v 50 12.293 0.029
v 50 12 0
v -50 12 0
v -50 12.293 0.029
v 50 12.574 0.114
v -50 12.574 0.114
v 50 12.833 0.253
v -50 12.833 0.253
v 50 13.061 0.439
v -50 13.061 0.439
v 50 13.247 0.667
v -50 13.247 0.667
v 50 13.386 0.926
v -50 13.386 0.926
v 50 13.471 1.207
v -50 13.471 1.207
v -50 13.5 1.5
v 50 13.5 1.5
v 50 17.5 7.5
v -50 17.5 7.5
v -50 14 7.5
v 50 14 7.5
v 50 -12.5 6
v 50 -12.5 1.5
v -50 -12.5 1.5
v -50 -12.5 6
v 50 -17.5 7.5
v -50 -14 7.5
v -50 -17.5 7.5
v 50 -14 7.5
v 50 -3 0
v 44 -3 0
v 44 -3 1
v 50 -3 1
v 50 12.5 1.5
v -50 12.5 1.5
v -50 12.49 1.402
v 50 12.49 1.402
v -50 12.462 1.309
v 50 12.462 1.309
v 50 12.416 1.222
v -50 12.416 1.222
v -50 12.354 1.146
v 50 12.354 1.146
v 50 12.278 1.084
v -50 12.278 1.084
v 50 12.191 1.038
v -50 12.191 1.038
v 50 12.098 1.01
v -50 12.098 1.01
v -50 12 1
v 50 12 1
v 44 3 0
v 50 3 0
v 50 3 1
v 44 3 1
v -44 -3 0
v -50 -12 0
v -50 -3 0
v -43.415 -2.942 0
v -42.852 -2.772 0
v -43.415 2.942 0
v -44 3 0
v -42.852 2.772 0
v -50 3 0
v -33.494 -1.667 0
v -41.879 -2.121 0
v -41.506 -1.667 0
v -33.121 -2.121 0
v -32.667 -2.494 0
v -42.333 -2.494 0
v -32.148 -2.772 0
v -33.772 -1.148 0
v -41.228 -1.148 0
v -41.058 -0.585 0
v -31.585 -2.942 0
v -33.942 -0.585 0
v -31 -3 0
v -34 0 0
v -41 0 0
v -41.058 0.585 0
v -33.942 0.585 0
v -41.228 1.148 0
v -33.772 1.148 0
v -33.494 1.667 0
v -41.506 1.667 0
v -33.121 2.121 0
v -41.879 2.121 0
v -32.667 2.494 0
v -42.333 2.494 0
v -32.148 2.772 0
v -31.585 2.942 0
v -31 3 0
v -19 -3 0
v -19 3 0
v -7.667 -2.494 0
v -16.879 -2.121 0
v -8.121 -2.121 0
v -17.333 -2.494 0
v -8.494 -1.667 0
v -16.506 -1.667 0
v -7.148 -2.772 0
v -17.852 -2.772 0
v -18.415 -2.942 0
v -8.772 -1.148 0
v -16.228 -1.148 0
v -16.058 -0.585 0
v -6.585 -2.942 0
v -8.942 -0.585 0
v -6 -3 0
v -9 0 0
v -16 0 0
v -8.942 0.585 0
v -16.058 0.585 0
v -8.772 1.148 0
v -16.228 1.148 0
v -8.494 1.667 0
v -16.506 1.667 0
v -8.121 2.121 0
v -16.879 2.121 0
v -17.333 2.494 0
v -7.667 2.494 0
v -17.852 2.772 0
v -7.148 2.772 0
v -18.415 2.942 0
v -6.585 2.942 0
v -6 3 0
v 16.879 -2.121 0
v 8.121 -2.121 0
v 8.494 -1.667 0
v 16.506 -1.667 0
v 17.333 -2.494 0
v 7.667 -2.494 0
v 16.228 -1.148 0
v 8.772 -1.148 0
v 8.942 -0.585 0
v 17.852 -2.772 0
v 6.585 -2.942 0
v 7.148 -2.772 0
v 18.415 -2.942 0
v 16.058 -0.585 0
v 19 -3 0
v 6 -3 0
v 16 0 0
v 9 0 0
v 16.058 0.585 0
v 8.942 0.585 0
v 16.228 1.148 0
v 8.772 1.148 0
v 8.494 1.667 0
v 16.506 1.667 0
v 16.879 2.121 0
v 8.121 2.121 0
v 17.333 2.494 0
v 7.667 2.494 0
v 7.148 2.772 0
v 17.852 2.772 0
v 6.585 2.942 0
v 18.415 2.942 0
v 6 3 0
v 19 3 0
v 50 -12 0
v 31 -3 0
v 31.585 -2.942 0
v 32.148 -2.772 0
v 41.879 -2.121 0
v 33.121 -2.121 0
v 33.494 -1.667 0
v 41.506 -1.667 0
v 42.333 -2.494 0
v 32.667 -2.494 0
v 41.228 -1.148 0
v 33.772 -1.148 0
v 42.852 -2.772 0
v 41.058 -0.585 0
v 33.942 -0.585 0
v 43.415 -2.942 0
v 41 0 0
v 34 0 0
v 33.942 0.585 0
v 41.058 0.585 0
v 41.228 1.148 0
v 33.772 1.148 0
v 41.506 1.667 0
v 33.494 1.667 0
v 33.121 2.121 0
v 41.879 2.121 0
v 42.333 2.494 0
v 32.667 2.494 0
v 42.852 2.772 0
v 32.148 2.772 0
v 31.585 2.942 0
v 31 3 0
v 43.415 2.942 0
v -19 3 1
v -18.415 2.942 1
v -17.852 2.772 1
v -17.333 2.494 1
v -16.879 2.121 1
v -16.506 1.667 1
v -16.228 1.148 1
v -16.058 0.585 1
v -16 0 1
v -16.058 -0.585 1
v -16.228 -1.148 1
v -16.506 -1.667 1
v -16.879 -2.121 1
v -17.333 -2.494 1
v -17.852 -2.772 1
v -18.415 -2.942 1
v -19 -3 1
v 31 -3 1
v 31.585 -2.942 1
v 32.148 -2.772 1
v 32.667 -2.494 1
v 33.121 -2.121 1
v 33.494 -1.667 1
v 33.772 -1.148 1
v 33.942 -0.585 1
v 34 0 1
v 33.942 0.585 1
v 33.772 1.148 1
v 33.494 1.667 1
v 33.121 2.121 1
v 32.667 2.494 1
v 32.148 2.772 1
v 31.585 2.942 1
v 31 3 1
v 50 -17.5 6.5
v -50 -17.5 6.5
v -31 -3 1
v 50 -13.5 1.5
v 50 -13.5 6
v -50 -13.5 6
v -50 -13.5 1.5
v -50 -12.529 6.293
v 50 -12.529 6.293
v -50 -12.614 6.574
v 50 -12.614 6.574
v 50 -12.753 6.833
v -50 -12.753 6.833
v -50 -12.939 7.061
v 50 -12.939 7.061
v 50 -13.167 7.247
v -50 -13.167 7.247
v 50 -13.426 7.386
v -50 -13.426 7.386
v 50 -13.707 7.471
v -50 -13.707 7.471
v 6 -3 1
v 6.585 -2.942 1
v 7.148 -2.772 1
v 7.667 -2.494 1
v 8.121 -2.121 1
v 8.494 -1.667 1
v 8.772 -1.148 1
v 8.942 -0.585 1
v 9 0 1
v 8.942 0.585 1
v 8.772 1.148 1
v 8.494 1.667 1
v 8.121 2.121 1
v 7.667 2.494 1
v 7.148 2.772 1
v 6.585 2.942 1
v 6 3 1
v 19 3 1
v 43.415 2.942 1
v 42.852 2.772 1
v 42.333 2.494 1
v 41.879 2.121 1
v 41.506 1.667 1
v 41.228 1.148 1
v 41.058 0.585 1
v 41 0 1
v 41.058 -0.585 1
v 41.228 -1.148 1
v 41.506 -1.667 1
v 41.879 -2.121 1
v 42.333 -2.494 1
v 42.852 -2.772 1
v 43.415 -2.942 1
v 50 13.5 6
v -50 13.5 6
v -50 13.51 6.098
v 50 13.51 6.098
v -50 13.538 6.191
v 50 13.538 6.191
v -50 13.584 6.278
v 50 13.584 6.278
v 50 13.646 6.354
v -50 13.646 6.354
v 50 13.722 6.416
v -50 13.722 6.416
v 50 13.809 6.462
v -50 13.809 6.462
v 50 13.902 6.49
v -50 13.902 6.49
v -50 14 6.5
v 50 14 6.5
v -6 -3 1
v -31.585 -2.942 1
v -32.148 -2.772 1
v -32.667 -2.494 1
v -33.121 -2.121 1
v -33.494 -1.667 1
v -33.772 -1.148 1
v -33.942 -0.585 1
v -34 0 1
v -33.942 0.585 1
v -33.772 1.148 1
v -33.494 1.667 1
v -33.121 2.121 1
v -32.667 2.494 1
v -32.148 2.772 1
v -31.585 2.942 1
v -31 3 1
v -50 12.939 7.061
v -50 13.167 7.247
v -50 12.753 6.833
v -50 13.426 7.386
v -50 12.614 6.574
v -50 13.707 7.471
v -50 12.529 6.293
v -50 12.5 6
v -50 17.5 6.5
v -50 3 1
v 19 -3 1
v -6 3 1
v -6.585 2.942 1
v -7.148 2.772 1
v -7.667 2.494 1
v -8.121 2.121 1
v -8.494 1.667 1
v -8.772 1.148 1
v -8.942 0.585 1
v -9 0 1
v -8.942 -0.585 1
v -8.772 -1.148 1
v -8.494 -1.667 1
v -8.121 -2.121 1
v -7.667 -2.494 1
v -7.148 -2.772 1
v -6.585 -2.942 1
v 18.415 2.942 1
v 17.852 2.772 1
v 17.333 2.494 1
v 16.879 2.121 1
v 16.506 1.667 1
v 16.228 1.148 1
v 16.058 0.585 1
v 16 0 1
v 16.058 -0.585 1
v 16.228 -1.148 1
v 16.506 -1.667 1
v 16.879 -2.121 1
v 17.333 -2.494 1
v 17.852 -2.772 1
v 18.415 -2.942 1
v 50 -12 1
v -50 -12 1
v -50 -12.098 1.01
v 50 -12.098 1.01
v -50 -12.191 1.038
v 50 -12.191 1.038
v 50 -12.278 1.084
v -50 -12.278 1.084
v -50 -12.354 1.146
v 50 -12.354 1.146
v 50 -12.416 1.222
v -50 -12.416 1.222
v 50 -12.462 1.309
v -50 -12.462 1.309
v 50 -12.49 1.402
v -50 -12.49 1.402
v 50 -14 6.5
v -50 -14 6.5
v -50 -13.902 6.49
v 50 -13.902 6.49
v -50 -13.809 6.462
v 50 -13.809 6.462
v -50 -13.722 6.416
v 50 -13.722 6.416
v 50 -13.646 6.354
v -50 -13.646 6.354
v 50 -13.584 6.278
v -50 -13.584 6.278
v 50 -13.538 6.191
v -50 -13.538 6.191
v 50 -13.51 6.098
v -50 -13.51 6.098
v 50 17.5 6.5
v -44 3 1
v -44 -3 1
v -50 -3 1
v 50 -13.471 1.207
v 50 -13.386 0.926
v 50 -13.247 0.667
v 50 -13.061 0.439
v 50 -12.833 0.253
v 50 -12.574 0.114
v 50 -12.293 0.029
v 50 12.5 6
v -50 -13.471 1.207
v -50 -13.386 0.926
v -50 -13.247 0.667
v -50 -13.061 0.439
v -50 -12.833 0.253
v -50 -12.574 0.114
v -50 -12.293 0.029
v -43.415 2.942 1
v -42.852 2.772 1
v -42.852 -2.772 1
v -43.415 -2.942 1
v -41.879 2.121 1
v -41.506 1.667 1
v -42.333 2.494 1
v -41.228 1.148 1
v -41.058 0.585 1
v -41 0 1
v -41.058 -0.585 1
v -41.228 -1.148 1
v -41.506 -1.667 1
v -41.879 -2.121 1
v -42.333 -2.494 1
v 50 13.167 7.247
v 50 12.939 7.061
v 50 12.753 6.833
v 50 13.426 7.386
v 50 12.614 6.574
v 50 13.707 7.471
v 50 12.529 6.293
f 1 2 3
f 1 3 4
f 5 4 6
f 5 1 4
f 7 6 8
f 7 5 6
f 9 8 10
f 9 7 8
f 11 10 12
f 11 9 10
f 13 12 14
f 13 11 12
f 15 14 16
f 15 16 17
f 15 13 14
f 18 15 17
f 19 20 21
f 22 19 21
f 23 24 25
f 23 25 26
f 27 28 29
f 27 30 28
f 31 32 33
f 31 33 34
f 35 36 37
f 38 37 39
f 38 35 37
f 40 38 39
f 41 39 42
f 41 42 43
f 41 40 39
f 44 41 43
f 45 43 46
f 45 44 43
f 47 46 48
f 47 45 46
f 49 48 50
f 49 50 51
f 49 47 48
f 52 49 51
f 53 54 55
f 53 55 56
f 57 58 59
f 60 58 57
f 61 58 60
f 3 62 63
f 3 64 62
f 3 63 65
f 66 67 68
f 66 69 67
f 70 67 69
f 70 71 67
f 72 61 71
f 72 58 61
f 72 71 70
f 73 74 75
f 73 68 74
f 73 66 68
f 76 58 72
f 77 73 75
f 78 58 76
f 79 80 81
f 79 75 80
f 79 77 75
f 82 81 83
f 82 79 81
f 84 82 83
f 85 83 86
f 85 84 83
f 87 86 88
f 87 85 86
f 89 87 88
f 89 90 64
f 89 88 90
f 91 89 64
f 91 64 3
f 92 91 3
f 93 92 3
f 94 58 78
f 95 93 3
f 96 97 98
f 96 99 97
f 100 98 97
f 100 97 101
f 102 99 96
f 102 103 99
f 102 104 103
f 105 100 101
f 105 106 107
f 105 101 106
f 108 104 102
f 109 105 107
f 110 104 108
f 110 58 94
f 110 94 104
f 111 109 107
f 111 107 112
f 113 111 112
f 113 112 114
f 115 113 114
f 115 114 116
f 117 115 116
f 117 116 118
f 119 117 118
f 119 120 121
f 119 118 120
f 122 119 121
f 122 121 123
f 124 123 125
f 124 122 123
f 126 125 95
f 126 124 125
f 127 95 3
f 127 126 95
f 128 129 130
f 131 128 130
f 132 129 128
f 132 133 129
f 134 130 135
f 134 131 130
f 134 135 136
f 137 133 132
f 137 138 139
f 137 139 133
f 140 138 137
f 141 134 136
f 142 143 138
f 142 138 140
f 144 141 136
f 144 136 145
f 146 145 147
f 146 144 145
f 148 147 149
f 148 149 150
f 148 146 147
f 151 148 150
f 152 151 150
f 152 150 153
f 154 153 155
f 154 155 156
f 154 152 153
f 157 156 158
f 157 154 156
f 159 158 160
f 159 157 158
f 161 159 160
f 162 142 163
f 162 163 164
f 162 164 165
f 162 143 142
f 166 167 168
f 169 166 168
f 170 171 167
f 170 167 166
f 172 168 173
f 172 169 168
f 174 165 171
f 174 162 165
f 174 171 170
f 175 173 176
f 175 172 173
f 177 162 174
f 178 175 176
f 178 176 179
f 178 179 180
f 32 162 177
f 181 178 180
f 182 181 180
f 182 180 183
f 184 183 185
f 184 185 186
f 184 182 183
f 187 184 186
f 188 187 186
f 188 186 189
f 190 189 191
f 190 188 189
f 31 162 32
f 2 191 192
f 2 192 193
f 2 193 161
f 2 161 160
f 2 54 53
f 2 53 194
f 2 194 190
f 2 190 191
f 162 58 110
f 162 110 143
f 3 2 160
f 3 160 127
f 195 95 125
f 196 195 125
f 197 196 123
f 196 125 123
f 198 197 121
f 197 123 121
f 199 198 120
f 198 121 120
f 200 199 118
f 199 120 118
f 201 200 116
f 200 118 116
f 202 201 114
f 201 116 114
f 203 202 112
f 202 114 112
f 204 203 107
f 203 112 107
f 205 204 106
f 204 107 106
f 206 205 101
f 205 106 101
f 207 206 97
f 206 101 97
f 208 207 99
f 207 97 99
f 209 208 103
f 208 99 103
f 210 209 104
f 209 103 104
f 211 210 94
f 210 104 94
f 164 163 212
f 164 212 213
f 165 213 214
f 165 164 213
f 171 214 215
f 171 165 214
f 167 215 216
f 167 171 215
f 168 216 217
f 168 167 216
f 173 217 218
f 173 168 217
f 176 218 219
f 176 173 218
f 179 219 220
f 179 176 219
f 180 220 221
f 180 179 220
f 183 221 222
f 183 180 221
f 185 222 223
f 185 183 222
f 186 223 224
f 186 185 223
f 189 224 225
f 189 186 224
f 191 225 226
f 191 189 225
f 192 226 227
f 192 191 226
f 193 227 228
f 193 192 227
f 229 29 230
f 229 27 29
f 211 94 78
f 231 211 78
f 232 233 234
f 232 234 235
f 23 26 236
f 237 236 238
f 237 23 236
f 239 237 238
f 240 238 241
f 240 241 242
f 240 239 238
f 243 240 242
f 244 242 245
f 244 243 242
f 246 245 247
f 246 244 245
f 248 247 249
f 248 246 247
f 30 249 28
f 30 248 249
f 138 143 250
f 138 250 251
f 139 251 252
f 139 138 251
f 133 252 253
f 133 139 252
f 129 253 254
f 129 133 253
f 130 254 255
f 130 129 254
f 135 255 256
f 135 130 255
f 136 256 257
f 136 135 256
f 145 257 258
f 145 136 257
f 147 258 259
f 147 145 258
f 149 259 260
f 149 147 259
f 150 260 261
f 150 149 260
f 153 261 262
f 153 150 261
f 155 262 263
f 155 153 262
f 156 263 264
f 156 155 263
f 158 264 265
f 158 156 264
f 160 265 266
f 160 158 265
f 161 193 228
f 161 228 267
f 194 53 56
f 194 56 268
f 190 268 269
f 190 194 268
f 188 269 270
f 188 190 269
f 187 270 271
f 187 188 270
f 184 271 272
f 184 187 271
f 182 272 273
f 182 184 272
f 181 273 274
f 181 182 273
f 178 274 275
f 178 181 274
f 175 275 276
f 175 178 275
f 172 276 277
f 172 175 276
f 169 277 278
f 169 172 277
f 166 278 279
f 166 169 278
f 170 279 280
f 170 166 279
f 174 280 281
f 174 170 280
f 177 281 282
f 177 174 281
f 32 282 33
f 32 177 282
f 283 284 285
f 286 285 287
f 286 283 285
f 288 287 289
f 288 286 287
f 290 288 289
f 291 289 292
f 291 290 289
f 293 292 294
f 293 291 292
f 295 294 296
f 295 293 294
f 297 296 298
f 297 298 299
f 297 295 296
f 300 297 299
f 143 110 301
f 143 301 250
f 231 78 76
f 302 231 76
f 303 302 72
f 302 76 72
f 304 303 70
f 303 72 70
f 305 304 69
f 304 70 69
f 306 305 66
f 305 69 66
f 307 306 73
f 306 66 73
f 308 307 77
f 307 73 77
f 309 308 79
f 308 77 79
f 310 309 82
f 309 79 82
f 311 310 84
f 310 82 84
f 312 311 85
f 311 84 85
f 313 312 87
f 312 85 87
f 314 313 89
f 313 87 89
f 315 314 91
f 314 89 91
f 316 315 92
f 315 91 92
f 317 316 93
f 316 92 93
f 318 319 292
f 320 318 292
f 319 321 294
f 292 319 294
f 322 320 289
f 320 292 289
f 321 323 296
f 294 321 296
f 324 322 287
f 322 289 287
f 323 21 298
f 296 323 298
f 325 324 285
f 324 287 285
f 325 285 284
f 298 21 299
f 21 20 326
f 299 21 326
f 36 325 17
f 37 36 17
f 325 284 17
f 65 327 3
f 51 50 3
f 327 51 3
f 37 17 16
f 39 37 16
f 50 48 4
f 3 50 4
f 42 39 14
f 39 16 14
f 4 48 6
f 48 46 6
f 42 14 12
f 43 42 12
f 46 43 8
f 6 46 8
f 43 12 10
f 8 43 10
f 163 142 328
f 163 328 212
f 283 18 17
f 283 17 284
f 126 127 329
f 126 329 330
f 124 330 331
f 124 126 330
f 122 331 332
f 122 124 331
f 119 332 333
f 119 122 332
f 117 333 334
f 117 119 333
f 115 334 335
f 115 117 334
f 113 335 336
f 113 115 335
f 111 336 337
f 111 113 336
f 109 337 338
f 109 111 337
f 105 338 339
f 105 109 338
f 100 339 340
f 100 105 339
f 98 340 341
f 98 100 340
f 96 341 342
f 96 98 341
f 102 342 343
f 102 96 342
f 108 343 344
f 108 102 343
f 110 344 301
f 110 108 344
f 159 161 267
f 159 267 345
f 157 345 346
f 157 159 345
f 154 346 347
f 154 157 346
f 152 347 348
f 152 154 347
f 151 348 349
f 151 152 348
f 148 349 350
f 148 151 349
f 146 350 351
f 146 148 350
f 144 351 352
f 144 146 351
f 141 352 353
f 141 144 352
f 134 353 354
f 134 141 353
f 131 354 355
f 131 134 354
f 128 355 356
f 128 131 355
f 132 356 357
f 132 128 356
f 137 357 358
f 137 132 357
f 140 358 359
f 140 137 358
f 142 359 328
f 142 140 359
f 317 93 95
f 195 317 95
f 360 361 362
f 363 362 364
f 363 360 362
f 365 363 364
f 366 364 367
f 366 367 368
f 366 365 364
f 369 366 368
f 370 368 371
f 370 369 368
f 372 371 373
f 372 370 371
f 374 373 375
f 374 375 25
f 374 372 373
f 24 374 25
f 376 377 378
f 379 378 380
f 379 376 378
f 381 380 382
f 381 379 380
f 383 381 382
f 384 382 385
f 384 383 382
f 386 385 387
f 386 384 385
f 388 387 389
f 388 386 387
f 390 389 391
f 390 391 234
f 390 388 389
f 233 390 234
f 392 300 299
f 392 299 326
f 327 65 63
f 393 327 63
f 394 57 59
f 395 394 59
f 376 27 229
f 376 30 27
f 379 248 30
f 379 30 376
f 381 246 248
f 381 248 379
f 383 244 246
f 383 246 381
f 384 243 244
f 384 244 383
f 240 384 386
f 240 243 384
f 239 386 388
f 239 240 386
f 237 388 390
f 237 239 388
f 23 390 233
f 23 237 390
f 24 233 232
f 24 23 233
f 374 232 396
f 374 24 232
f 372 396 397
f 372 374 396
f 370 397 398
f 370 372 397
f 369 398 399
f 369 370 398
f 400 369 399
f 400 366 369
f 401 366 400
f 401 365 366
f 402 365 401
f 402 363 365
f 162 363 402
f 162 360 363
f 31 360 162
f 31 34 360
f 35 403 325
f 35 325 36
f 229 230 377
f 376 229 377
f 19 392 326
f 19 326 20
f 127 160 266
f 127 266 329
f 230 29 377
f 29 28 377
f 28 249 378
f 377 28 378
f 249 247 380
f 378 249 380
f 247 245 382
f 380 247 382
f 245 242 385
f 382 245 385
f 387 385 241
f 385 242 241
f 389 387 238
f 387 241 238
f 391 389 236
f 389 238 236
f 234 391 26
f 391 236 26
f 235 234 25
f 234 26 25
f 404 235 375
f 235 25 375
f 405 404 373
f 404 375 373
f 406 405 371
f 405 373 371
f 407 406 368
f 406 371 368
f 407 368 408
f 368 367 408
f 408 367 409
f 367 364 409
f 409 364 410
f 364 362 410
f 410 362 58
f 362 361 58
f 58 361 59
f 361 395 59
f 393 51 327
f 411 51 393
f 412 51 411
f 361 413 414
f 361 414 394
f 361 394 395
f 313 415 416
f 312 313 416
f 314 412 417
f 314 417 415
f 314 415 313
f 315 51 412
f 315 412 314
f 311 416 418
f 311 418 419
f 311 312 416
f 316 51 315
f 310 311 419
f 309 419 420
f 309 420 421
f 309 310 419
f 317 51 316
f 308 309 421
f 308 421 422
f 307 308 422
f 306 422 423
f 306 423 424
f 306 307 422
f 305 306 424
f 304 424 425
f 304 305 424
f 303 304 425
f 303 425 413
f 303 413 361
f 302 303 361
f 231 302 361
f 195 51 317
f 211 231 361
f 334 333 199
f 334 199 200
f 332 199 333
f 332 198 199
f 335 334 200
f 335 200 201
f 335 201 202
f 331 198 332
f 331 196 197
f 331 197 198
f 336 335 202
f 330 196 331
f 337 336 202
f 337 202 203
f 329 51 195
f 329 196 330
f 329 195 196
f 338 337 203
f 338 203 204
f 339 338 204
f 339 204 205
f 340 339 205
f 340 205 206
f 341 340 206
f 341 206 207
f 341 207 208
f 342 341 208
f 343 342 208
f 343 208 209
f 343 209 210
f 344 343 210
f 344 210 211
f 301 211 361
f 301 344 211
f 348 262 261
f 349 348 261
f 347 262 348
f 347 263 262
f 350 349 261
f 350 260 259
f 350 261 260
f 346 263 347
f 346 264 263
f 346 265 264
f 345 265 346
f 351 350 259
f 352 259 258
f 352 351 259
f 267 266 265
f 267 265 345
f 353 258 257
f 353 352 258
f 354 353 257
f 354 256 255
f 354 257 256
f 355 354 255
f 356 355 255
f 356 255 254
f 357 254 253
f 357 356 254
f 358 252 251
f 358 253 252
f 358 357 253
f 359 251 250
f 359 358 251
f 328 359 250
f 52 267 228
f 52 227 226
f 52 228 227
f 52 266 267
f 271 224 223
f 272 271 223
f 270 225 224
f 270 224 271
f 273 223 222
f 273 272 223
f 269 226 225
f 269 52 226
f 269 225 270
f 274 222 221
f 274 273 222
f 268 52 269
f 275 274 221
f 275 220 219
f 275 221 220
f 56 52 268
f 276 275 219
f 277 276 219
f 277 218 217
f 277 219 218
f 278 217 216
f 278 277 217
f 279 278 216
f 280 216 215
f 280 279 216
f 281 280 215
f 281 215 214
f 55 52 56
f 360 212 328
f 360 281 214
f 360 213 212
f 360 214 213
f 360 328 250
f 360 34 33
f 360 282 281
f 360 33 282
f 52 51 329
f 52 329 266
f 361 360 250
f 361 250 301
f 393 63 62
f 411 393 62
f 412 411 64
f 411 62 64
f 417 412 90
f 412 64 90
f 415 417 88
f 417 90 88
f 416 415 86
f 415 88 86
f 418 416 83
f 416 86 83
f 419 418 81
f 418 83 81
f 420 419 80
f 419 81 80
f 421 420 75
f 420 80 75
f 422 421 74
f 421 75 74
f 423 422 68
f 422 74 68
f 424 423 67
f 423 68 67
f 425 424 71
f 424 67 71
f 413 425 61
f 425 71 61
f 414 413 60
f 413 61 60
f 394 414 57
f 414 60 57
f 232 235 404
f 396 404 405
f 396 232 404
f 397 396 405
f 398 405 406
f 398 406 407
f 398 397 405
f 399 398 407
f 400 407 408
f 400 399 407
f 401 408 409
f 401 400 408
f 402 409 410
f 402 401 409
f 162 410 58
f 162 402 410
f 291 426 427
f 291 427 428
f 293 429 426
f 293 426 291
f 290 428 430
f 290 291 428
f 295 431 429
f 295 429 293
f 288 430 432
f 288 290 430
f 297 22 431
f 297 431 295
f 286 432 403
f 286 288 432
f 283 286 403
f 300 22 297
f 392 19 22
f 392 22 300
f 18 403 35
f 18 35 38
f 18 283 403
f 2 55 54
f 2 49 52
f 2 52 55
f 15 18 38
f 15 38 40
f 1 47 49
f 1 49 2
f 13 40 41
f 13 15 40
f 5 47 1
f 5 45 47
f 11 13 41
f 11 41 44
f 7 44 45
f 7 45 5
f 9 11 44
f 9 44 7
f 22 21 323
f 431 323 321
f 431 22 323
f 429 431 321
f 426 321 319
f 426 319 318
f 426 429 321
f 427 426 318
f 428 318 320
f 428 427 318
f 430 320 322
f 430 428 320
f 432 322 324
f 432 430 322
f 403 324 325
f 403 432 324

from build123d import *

# Parameters (mm, degrees)
EXTRUDE_1_DEPTH           = 50
HOLE_WIZARD_6_0_6_1_DEPTH = 1
PATTERN_LINEAR_1_COUNT    = 3
PATTERN_LINEAR_1_PITCH    = 25
MIRROR_1_COPY_1_DEPTH     = 1
MIRROR_1_COPY_2_DEPTH     = 1
MIRROR_1_COPY_3_DEPTH     = 1


# Read off the part's stored shape, not the designer's step: Диаметр отверстия Ø6.0 (6)1
with BuildPart() as part:
    # Эскиз1 → Вытянуть-Тонкостенный1 (new, symmetric)
    with BuildSketch(Plane(origin=(0, 0, 0), x_dir=(0, 0, -1), z_dir=(1, 0, 0))):
        with BuildLine():
            Line((-6.5, -17.5), (-6.5, -14))
            ThreePointArc((-6.5, -14), (-6.353553391, -13.646446609), (-6, -13.5))
            Line((-6, -13.5), (-1.5, -13.5))
            ThreePointArc((-1.5, -13.5), (-0.439339828, -13.060660172), (0, -12))
            Line((0, -12), (0, 12))
            ThreePointArc((0, 12), (-0.439339828, 13.060660172), (-1.5, 13.5))
            Line((-1.5, 13.5), (-6, 13.5))
            ThreePointArc((-6, 13.5), (-6.353553391, 13.646446609), (-6.5, 14))
            Line((-6.5, 14), (-6.5, 17.5))
            Line((-6.5, 17.5), (-7.5, 17.5))
            Line((-7.5, 17.5), (-7.5, 14))
            ThreePointArc((-7.5, 14), (-7.060660172, 12.939339828), (-6, 12.5))
            Line((-6, 12.5), (-1.5, 12.5))
            ThreePointArc((-1.5, 12.5), (-1.146446609, 12.353553391), (-1, 12))
            Line((-1, 12), (-1, -12))
            ThreePointArc((-1, -12), (-1.146446609, -12.353553391), (-1.5, -12.5))
            Line((-1.5, -12.5), (-6, -12.5))
            ThreePointArc((-6, -12.5), (-7.060660172, -12.939339828), (-7.5, -14))
            Line((-7.5, -14), (-7.5, -17.5))
            Line((-7.5, -17.5), (-6.5, -17.5))
        make_face()
    extrude(amount=EXTRUDE_1_DEPTH, both=True)

    # Диаметр отверстия Ø6.0 (6)1 outline → Диаметр отверстия Ø6.0 (6)1 (cut)
    with BuildSketch(Plane.XY):
        with BuildLine():
            Line((-6, -3), (6, -3))
            ThreePointArc((6, -3), (9, 0), (6, 3))
            Line((6, 3), (-6, 3))
            ThreePointArc((-6, 3), (-9, 0), (-6, -3))
        make_face()
    hole_wizard_6_0_6_1 = extrude(amount=HOLE_WIZARD_6_0_6_1_DEPTH, mode=Mode.SUBTRACT)

    # Линейный массив1: Диаметр отверстия Ø6.0 (6)1 ×3
    with Locations(*[(i * PATTERN_LINEAR_1_PITCH, 0, 0) for i in range(1, PATTERN_LINEAR_1_COUNT)]):
        add(hole_wizard_6_0_6_1, mode=Mode.SUBTRACT)

    # Зеркальное отражение1 copy 1 sketch → Зеркальное отражение1 copy 1 (cut)
    with BuildSketch(Plane(origin=(-25, 0, 0), x_dir=(-1, 0, 0), z_dir=(0, 0, 1))):
        with BuildLine():
            Line((-6, 3), (6, 3))
            ThreePointArc((6, 3), (9, 0), (6, -3))
            Line((6, -3), (-6, -3))
            ThreePointArc((-6, -3), (-9, 0), (-6, 3))
        make_face()
    extrude(amount=MIRROR_1_COPY_1_DEPTH, mode=Mode.SUBTRACT)

    # Зеркальное отражение1 copy 2 sketch → Зеркальное отражение1 copy 2 (cut)
    with BuildSketch(Plane(origin=(-50, 0, 0), x_dir=(-1, 0, 0), z_dir=(0, 0, 1))):
        with BuildLine():
            Line((-6, 3), (6, 3))
            ThreePointArc((6, 3), (9, 0), (6, -3))
            Line((6, -3), (-6, -3))
            ThreePointArc((-6, -3), (-9, 0), (-6, 3))
        make_face()
    extrude(amount=MIRROR_1_COPY_2_DEPTH, mode=Mode.SUBTRACT)

    # Зеркальное отражение1 copy 3 sketch → Зеркальное отражение1 copy 3 (cut)
    with BuildSketch(Plane(origin=(0, 0, 0), x_dir=(-1, 0, 0), z_dir=(0, 0, 1))):
        with BuildLine():
            Line((-6, 3), (6, 3))
            ThreePointArc((6, 3), (9, 0), (6, -3))
            Line((6, -3), (-6, -3))
            ThreePointArc((-6, -3), (-9, 0), (-6, 3))
        make_face()
    extrude(amount=MIRROR_1_COPY_3_DEPTH, mode=Mode.SUBTRACT)


solid = part.part
